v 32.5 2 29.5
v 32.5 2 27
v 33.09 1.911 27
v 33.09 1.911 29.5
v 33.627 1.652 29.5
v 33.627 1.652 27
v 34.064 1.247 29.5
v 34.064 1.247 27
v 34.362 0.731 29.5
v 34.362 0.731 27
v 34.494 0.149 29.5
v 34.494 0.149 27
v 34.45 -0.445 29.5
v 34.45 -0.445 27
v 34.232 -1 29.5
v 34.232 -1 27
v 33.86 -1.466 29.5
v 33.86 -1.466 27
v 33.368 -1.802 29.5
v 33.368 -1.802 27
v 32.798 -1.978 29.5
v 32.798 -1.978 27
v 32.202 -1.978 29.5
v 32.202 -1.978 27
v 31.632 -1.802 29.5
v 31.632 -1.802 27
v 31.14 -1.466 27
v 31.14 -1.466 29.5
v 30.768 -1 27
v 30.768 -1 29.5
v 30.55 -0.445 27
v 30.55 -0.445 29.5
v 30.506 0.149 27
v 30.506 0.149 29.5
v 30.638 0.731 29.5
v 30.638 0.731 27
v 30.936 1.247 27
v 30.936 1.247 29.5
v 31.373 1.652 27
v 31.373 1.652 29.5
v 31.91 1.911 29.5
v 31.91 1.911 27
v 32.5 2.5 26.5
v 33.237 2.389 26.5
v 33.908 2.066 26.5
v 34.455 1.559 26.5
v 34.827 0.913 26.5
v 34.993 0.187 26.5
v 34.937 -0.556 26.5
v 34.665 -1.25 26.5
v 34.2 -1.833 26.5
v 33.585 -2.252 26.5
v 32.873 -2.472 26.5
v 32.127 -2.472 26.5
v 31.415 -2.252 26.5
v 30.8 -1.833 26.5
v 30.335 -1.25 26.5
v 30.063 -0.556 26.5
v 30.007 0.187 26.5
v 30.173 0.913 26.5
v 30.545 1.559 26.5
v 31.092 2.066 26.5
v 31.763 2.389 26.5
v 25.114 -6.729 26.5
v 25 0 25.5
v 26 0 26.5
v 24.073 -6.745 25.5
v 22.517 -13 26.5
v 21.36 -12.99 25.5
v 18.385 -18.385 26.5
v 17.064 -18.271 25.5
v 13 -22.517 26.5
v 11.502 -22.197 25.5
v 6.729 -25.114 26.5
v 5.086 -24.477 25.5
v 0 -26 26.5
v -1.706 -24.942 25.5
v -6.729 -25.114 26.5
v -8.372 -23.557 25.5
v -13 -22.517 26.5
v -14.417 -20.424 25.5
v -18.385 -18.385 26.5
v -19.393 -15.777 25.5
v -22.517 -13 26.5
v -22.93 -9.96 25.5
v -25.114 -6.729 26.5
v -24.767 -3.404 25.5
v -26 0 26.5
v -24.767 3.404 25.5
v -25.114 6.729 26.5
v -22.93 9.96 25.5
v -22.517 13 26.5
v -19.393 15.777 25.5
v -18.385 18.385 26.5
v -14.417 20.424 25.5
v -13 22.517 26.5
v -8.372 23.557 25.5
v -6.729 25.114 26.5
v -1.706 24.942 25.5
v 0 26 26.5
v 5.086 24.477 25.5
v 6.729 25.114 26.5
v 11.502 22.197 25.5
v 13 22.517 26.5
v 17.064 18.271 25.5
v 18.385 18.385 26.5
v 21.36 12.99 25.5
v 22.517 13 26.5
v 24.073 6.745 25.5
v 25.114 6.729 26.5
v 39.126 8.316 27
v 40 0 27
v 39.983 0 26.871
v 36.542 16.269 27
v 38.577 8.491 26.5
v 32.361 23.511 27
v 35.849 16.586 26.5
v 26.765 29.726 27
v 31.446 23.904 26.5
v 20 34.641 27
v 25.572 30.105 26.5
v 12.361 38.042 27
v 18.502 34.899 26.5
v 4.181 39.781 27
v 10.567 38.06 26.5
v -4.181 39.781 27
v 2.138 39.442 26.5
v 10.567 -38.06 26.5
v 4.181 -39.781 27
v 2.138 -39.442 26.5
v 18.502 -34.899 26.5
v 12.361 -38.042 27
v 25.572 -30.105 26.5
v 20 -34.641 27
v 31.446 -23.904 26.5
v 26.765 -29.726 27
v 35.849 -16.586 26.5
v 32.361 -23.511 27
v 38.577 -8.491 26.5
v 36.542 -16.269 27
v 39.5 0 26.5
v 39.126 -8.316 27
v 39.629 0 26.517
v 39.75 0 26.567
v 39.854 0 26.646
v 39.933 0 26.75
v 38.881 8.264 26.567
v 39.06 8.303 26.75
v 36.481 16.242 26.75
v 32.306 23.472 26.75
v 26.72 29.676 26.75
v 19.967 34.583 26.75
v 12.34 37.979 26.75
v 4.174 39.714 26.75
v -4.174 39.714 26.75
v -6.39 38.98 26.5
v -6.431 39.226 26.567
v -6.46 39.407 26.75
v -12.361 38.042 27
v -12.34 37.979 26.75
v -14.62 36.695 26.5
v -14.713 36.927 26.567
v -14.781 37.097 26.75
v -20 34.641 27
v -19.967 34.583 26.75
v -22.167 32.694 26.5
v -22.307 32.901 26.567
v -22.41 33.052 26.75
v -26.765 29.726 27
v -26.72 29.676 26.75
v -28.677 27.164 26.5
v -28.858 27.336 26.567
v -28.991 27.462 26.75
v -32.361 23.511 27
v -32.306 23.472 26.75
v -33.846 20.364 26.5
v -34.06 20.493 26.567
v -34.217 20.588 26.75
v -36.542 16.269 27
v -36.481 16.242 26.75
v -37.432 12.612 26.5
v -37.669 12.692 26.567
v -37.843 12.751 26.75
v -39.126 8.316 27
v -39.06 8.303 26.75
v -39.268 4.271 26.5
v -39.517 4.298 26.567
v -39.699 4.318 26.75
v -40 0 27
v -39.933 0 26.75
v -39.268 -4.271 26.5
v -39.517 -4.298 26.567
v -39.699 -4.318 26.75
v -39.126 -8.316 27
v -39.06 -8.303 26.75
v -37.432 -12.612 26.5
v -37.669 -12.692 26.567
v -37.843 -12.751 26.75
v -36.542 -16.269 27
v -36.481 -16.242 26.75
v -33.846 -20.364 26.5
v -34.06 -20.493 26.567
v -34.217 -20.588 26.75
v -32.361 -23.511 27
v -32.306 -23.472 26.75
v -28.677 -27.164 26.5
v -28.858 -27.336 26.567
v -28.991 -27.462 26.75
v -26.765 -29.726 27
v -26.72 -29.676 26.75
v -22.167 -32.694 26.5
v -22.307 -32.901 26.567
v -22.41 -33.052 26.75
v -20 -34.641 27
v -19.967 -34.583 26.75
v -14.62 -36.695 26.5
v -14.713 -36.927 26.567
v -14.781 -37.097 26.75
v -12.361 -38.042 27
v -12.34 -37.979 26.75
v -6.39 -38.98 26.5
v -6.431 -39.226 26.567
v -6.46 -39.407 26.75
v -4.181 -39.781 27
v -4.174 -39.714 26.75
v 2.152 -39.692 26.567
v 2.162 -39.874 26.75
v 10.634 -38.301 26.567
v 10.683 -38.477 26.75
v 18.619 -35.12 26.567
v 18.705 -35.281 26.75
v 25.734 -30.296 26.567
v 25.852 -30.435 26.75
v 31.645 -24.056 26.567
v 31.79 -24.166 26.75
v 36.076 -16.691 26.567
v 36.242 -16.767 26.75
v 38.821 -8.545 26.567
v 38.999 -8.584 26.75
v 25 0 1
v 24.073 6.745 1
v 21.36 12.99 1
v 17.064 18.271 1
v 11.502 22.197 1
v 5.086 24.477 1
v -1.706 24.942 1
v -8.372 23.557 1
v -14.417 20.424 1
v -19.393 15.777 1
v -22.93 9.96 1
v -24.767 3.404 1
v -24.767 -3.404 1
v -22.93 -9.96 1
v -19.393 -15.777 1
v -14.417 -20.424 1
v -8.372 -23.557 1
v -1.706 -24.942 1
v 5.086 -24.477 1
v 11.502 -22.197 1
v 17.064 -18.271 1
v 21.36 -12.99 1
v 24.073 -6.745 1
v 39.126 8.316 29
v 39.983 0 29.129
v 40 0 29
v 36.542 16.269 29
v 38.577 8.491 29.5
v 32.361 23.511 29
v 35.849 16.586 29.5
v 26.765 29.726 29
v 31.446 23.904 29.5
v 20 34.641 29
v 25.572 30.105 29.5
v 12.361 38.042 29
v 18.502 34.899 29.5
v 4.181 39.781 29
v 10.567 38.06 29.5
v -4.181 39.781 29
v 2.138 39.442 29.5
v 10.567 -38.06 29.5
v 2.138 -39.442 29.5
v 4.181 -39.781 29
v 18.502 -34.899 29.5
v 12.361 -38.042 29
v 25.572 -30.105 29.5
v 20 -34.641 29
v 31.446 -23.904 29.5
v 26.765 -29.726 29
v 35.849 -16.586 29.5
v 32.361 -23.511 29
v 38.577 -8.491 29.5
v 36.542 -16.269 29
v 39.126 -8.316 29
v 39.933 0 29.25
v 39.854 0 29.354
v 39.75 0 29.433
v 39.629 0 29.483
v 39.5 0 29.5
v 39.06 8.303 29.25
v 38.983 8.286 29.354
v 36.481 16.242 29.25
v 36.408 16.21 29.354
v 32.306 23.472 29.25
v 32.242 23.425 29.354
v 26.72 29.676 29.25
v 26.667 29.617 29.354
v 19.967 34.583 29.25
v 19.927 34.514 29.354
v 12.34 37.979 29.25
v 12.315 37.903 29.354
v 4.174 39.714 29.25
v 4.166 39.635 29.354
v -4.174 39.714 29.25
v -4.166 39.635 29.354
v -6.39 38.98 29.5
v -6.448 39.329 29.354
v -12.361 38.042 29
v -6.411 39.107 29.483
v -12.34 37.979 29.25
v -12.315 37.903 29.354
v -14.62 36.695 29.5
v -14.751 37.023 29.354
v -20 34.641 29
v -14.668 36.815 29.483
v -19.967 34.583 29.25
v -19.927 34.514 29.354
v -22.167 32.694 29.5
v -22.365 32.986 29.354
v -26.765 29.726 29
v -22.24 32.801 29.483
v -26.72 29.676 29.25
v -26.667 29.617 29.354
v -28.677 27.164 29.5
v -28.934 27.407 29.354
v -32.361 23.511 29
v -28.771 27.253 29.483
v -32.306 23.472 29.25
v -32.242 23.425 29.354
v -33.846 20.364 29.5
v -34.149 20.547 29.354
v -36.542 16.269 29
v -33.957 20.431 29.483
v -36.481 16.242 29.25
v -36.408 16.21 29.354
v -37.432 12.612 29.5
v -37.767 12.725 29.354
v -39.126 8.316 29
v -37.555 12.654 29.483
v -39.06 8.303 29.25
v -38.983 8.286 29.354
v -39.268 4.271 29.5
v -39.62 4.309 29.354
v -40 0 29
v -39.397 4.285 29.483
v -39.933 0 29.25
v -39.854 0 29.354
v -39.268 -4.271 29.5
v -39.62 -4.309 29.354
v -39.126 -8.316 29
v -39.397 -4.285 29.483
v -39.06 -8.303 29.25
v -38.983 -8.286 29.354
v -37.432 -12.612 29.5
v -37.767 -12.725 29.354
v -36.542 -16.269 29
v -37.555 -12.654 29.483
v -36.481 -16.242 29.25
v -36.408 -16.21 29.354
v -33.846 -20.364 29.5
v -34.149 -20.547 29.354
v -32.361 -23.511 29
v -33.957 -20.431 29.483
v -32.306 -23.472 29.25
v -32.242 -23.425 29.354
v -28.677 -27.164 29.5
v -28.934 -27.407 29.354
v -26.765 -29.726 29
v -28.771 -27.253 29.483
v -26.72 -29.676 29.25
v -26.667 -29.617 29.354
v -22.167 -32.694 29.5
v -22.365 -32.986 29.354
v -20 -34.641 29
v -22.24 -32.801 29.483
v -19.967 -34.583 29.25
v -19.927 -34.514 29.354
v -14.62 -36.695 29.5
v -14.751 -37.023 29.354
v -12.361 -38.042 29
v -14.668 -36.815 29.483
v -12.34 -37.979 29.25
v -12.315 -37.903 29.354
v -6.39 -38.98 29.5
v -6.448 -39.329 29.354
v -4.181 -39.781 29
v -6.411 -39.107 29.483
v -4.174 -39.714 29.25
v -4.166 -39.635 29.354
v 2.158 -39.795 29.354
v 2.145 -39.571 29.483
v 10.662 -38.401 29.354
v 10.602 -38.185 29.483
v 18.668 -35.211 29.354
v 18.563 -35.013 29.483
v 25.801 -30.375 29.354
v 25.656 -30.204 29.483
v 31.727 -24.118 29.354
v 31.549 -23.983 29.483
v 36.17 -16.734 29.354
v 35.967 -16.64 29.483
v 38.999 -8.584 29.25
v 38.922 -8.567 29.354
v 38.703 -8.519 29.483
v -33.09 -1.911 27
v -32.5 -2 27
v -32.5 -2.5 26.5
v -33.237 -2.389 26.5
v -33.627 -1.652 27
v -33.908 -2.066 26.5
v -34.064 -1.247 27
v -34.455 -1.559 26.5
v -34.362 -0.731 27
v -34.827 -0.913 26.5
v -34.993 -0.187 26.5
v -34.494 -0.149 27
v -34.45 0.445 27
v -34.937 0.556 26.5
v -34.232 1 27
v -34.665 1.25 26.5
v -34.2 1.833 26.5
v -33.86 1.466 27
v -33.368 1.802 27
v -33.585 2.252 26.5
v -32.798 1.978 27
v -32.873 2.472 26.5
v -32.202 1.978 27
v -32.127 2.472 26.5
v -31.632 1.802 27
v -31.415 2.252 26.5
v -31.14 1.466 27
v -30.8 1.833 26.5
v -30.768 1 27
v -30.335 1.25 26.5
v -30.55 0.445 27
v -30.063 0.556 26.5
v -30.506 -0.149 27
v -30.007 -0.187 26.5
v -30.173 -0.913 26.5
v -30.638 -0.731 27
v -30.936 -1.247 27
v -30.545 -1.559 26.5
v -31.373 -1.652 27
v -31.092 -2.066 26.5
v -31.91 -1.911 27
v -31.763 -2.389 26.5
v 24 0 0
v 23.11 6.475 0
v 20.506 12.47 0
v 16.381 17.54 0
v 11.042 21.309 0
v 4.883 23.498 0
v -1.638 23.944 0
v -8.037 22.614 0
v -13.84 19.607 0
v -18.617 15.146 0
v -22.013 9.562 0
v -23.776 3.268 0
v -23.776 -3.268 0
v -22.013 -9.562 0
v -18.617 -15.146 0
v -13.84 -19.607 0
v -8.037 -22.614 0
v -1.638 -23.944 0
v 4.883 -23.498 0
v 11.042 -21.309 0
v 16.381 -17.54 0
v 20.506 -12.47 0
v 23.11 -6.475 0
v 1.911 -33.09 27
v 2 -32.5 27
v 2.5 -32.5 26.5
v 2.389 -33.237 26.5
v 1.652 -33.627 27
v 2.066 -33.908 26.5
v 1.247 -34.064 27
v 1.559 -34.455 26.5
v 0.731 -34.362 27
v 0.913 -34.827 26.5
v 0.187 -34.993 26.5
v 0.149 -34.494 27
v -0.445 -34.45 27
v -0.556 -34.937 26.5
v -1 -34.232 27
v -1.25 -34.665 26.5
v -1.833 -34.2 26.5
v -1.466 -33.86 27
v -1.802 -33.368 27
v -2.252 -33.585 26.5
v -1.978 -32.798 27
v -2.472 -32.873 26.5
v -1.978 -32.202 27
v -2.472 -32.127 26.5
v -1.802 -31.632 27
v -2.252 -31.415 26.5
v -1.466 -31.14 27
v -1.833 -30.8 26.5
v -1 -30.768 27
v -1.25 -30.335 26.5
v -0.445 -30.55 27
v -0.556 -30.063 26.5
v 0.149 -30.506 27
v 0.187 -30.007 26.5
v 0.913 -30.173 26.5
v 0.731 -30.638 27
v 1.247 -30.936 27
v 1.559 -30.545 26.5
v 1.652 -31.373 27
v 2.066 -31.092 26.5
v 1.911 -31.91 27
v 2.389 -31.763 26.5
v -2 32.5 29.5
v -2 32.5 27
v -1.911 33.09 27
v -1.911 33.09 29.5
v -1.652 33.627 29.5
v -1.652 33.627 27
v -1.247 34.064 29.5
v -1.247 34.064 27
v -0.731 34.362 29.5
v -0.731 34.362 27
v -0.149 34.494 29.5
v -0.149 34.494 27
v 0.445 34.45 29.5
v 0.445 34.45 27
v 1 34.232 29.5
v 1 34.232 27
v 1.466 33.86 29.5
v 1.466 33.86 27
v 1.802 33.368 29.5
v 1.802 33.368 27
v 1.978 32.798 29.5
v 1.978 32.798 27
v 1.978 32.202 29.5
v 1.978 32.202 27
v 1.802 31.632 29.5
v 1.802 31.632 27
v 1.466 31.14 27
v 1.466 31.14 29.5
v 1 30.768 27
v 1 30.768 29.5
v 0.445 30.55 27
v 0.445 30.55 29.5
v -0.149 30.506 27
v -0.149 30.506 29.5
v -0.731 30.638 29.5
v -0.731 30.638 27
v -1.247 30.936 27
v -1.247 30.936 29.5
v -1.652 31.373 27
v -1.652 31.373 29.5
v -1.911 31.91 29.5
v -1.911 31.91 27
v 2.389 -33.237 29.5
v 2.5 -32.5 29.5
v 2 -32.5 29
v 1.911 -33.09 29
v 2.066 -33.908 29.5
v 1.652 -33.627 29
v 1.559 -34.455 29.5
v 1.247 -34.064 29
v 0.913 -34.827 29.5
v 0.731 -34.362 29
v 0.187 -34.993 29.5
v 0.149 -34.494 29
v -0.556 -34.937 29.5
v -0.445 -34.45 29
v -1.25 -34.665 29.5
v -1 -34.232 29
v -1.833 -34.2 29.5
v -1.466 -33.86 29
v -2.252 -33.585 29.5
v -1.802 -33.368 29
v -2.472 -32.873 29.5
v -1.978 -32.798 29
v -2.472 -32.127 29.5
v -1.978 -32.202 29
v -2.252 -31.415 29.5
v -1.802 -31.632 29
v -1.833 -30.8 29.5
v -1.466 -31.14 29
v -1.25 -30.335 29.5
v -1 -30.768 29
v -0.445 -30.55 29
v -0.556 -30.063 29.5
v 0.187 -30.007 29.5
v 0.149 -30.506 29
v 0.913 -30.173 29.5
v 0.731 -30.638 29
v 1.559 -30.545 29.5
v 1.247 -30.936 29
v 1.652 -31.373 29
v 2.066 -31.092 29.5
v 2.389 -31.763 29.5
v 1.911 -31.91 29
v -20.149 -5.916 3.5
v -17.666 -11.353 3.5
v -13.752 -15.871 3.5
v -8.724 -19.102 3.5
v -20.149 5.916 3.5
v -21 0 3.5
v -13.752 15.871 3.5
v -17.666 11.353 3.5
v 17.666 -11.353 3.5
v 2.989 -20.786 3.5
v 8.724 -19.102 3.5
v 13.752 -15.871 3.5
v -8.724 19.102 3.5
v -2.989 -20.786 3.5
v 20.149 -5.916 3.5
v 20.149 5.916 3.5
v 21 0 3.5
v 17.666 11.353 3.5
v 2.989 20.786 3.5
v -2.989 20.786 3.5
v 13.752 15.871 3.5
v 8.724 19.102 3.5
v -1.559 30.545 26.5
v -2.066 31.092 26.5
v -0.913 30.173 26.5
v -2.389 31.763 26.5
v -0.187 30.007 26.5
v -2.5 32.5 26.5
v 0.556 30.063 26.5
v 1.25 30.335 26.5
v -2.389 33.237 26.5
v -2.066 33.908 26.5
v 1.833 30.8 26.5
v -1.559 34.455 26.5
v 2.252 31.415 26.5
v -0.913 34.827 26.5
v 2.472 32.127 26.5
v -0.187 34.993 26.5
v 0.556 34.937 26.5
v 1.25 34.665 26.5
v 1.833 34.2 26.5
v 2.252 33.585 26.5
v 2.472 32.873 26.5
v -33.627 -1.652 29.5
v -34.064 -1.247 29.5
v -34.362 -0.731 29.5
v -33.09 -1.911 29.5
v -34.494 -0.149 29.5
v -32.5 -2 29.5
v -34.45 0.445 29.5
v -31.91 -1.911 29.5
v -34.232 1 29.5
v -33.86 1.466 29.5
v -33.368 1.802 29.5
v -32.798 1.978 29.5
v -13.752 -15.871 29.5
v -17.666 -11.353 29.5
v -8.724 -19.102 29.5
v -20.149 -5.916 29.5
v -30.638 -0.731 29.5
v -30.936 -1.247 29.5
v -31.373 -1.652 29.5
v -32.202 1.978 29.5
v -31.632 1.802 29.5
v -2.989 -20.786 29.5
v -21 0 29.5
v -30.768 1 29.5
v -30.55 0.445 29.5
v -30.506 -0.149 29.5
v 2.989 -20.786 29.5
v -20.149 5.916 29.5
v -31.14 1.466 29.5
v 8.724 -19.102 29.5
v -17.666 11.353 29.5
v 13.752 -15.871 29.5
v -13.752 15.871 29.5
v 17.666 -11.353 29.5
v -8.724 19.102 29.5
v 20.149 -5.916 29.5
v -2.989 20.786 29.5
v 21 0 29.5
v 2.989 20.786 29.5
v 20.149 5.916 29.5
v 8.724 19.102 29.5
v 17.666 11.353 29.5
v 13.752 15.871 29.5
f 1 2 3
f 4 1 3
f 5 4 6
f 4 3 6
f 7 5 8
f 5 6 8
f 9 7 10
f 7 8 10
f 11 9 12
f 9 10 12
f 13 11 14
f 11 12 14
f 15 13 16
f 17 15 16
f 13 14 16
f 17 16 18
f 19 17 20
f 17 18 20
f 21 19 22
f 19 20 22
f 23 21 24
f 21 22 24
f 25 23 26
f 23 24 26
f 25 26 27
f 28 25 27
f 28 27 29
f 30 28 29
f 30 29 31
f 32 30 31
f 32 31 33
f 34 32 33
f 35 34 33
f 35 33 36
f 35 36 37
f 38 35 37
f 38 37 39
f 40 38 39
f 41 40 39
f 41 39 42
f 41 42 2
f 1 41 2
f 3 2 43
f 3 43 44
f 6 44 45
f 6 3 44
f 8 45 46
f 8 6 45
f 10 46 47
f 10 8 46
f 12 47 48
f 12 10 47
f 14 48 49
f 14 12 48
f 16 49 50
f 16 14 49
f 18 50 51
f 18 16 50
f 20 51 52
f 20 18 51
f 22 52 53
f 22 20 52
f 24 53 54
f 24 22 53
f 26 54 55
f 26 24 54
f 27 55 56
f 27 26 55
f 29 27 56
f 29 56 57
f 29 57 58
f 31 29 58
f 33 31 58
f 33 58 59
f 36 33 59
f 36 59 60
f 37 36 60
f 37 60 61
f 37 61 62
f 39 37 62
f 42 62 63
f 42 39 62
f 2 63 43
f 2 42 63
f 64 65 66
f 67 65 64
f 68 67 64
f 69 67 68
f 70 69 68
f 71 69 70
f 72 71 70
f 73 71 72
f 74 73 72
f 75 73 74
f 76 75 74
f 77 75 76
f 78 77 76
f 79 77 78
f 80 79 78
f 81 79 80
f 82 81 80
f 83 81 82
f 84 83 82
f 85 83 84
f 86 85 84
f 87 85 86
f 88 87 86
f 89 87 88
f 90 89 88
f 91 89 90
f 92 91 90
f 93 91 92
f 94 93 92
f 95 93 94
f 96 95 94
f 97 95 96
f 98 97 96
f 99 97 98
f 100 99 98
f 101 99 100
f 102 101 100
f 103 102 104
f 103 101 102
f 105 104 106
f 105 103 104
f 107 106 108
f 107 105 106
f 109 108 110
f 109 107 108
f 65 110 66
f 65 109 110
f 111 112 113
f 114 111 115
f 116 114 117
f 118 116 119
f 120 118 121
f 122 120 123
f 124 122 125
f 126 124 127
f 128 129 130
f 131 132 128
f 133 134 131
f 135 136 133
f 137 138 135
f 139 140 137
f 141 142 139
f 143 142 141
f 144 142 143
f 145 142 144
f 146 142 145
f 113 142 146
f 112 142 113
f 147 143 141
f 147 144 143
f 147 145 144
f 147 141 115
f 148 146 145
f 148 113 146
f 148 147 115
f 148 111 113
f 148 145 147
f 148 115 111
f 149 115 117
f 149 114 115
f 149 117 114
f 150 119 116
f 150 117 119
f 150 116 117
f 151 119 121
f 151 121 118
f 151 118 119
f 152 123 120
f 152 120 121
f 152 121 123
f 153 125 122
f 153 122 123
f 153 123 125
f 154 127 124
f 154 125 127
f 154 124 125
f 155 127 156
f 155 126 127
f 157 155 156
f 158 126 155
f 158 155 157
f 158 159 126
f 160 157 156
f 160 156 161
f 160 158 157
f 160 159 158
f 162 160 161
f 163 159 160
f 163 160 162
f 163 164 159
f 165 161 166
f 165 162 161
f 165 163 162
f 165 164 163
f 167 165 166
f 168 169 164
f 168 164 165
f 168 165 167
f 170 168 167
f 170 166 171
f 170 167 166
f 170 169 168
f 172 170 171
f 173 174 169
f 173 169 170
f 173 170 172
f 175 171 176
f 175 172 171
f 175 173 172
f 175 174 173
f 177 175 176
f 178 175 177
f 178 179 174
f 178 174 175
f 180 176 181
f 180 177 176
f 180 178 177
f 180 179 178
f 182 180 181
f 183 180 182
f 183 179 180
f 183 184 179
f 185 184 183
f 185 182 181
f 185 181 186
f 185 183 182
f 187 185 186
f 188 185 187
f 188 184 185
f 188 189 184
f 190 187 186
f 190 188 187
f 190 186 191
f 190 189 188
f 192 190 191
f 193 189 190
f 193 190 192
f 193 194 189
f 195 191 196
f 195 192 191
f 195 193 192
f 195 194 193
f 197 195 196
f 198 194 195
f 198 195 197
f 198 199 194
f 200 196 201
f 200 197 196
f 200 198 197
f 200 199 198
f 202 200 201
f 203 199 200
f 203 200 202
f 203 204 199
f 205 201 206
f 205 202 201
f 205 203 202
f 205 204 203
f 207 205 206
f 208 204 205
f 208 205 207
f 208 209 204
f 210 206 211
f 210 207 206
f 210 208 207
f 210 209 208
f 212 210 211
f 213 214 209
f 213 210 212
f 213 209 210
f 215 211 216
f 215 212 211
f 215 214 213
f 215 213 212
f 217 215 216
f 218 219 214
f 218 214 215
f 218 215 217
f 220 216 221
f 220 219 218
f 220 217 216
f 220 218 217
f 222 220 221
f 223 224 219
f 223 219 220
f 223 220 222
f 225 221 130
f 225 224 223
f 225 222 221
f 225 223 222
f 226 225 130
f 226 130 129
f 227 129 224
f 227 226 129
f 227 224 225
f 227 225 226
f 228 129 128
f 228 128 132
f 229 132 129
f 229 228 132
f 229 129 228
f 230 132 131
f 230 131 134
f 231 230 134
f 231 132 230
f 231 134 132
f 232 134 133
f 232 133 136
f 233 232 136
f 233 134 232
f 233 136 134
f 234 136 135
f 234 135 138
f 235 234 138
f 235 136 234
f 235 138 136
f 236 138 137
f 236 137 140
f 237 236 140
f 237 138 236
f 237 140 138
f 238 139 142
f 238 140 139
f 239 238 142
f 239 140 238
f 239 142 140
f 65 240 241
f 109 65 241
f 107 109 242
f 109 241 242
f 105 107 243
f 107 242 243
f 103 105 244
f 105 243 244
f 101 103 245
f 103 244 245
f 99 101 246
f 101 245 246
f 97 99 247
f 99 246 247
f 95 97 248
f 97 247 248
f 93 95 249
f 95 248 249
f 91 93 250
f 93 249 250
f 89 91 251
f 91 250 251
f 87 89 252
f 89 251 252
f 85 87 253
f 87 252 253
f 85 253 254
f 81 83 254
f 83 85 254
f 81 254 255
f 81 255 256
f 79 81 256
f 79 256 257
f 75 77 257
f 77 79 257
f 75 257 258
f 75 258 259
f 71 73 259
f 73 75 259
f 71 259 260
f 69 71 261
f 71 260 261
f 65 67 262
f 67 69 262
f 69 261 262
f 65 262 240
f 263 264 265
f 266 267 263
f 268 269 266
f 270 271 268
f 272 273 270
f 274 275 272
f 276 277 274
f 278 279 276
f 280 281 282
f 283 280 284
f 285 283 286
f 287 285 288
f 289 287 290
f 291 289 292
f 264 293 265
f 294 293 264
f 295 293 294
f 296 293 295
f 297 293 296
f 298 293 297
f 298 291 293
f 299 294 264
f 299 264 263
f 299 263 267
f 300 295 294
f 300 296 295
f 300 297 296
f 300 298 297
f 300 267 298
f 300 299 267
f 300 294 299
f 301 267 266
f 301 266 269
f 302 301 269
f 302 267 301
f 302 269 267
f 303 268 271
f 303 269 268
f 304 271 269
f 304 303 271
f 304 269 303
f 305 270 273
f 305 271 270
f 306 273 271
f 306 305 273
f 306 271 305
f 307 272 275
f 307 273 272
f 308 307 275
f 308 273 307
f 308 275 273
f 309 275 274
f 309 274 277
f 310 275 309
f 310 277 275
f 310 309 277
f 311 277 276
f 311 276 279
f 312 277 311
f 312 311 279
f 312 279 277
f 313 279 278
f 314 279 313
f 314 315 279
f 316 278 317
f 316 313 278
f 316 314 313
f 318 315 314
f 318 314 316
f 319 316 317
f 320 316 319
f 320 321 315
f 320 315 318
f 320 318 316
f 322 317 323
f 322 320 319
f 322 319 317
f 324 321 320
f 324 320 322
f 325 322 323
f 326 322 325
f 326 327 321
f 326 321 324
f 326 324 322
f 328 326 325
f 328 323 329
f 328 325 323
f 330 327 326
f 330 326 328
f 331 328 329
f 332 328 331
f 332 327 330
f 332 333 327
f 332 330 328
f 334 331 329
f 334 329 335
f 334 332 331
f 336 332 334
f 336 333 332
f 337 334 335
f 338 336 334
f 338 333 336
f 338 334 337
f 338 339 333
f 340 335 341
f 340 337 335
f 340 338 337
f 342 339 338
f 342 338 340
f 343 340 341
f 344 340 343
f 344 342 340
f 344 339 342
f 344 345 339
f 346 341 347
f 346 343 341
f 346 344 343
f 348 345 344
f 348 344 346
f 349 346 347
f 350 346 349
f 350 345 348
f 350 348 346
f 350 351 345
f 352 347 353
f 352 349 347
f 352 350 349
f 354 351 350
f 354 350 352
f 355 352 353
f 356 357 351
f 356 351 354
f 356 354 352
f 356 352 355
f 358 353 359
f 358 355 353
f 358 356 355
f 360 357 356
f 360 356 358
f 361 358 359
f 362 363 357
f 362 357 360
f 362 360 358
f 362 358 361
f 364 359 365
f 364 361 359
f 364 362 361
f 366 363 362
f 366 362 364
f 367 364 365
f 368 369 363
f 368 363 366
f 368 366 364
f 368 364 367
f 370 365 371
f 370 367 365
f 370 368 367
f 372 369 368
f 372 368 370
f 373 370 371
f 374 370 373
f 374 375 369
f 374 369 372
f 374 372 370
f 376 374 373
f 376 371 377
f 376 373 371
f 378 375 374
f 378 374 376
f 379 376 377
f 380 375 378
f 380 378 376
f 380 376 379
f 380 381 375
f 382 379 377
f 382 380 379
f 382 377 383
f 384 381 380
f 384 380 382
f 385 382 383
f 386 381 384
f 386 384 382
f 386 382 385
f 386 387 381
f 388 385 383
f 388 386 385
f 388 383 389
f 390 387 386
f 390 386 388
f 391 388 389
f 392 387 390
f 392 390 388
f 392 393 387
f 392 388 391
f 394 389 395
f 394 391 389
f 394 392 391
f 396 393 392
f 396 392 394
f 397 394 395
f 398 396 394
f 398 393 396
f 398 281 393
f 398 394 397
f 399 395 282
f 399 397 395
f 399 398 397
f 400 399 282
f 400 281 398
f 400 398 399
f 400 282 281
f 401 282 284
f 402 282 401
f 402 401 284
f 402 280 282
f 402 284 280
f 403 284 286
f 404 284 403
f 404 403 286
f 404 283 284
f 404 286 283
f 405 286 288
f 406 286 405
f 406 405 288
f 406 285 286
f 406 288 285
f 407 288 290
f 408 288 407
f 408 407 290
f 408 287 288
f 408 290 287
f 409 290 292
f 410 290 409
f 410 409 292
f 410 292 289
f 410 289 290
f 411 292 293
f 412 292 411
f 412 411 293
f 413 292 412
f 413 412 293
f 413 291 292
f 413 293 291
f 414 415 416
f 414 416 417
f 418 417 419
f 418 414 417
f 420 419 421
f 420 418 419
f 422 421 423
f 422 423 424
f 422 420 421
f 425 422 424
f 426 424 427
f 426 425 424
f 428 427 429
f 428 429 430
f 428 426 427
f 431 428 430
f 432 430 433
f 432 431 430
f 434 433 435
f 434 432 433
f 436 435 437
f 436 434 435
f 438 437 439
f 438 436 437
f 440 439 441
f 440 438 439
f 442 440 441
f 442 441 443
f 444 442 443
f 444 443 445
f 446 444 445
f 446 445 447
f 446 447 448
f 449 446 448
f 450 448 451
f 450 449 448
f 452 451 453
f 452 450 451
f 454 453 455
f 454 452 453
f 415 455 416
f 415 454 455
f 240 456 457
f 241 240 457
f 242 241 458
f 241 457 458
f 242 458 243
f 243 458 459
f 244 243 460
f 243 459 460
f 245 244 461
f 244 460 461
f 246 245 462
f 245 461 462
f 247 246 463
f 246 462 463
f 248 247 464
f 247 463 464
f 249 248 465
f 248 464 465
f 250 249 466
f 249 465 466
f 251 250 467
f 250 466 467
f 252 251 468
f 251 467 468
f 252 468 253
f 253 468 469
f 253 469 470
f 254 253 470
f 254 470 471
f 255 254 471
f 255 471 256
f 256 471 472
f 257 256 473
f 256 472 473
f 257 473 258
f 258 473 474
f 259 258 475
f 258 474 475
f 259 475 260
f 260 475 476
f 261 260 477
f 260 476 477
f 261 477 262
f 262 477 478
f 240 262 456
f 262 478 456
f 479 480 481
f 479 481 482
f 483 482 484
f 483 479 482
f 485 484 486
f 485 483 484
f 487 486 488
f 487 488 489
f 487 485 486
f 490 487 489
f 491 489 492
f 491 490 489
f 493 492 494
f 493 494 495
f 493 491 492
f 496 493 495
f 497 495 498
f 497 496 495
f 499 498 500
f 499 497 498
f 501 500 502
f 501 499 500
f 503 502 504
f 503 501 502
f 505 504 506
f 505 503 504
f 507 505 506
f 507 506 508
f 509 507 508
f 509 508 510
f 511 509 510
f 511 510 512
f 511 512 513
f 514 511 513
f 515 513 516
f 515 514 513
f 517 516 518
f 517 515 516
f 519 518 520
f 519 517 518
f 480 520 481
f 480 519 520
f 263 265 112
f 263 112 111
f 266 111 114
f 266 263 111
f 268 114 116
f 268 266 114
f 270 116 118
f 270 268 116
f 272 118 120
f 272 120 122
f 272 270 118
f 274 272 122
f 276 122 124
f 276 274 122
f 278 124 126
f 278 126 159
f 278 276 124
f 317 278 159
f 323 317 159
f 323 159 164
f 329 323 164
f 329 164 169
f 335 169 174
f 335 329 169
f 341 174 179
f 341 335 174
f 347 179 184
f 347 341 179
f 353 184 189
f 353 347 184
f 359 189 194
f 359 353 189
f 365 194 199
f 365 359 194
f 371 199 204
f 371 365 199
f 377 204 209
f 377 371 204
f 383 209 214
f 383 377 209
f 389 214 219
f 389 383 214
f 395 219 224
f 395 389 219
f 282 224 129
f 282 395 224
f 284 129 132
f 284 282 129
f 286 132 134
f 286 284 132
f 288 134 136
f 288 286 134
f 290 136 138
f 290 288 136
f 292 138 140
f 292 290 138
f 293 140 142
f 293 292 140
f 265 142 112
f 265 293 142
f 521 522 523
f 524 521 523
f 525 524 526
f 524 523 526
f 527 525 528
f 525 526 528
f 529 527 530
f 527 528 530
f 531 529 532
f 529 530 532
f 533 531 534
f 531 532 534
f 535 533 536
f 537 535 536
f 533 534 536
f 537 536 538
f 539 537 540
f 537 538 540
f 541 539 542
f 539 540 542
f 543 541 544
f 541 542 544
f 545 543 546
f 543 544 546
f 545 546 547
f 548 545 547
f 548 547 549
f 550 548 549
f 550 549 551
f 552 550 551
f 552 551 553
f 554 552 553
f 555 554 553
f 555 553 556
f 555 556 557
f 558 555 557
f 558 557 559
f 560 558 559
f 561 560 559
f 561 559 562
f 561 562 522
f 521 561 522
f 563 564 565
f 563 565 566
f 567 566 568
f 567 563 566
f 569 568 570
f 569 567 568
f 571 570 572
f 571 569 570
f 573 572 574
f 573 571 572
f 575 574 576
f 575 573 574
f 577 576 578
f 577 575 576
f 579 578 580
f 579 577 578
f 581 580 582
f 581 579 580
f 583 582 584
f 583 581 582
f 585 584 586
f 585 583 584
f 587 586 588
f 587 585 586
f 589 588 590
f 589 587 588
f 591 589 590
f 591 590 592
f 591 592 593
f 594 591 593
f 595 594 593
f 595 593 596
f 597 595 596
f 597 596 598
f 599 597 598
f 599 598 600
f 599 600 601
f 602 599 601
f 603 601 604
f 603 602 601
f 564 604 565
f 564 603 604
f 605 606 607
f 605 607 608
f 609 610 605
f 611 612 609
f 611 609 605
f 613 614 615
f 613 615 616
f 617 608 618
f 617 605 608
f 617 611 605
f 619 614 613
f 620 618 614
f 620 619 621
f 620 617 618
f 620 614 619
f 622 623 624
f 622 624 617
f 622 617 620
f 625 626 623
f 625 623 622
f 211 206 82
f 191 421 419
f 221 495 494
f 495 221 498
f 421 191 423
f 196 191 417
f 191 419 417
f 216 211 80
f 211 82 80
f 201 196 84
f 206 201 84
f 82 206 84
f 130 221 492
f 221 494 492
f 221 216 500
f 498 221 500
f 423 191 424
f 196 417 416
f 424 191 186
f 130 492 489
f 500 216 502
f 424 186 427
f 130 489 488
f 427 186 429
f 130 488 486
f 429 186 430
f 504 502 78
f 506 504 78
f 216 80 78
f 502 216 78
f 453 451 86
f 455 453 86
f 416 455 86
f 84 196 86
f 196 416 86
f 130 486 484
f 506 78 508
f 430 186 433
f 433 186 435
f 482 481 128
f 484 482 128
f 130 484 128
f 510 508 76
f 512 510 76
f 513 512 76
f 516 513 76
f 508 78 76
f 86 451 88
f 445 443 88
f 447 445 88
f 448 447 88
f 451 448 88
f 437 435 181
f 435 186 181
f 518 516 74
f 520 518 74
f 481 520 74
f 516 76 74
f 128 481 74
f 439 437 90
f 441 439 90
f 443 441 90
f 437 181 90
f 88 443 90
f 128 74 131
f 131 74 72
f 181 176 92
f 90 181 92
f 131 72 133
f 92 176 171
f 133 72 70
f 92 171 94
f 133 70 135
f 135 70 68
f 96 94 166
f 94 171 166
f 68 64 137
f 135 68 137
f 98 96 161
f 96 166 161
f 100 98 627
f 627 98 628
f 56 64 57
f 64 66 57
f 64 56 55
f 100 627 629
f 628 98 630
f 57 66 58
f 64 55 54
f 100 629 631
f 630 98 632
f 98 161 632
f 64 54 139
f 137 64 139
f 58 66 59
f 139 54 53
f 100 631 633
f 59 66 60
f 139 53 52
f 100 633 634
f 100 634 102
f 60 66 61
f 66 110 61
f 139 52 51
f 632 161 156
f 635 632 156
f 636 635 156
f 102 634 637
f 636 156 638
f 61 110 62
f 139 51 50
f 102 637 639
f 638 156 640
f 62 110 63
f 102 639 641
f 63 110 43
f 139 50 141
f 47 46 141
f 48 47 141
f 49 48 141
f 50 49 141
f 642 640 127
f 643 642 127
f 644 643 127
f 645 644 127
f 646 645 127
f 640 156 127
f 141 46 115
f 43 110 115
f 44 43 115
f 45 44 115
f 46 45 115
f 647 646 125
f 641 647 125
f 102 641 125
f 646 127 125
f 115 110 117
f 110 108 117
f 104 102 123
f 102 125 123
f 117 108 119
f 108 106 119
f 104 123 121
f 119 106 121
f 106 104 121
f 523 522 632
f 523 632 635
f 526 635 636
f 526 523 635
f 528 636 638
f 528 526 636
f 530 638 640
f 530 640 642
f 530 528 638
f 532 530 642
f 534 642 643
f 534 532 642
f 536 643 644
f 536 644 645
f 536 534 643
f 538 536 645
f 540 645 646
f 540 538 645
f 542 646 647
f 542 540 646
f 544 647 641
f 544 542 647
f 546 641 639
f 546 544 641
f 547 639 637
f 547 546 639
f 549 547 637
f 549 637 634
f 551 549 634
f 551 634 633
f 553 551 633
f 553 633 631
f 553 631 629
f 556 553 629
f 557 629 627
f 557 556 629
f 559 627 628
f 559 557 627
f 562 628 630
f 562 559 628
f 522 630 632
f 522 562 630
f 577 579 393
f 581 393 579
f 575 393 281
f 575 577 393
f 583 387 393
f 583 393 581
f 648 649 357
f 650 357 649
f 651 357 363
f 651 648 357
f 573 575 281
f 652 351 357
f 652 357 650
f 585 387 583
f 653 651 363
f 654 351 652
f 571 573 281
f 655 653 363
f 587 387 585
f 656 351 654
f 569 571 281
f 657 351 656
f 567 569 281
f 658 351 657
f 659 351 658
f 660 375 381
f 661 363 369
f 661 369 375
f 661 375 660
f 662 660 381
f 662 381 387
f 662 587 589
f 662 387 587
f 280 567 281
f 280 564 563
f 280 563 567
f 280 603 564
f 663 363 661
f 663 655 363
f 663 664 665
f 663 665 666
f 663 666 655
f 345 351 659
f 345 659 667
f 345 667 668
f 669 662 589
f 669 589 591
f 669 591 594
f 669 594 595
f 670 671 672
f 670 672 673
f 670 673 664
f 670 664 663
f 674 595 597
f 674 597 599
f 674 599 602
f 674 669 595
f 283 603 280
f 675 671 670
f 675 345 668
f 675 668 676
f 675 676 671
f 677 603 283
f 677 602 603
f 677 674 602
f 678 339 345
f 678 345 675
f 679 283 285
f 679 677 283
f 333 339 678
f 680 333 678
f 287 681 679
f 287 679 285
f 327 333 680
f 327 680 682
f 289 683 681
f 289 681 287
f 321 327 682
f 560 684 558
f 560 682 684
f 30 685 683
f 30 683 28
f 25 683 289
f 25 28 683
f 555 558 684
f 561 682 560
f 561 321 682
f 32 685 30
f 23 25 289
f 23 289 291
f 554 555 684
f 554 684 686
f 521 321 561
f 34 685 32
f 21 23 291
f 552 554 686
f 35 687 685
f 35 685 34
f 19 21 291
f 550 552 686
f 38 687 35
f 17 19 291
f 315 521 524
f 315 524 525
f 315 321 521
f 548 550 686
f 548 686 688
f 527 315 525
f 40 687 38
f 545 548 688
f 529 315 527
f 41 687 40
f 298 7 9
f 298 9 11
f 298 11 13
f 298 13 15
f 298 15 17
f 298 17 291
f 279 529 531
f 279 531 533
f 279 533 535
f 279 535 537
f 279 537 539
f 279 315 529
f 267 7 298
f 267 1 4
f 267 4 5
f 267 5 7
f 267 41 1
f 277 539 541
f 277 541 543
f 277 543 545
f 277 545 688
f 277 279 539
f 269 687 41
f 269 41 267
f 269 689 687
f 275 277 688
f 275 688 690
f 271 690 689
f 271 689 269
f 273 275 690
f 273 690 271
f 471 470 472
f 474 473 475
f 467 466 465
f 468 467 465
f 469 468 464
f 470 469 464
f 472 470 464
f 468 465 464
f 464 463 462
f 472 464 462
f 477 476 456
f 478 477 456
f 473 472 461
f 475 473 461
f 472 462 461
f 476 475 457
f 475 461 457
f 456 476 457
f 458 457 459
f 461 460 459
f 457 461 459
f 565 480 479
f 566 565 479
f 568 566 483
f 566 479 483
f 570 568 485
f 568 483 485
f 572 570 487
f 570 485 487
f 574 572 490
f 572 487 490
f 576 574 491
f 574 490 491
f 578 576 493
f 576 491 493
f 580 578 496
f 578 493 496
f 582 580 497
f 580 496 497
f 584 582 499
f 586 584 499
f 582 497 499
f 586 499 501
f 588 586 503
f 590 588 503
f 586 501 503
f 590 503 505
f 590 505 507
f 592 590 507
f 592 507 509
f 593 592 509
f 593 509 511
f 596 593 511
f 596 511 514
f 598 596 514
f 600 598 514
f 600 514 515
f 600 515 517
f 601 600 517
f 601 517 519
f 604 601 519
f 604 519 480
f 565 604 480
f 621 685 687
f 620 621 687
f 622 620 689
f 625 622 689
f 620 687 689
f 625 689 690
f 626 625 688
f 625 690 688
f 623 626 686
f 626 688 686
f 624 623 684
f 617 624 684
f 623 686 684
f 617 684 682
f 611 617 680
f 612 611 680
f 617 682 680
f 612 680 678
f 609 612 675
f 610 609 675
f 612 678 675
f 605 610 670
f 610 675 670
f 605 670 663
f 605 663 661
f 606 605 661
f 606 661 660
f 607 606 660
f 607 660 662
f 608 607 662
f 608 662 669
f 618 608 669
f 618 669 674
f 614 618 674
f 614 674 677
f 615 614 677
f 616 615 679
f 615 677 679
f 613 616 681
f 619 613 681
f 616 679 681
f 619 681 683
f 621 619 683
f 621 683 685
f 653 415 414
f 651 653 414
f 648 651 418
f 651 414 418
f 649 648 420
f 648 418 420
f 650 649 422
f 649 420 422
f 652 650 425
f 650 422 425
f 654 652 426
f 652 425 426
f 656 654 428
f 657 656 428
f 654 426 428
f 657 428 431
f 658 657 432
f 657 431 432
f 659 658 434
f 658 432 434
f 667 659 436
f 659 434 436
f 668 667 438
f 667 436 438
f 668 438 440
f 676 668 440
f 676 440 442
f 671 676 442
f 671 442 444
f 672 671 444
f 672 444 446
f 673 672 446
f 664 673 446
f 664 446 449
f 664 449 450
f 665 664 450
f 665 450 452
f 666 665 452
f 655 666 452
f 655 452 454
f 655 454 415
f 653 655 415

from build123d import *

# Parameters (mm, degrees)
SKETCH1_R           = 25
BOSS_EXTRUDE1_DEPTH = 29.5
SKETCH2_R           = 40
BOSS_EXTRUDE2_DEPTH = 3
CHAMFER1_SIZE       = 1
SKETCH3_R           = 21
CUT_EXTRUDE1_DEPTH  = 26
FILLET1_R           = 0.5
SKETCH4_R           = 2
CUT_EXTRUDE2_DEPTH  = 26
CIRPATTERN1_COUNT   = 4
CHAMFER2_SIZE       = 0.5


with BuildPart() as part:
    # Sketch1 → Boss-Extrude1 (new body)
    with BuildSketch(Plane.XY):
        Circle(SKETCH1_R)
    extrude(amount=BOSS_EXTRUDE1_DEPTH)

    # Sketch2 → Boss-Extrude2 (add)
    with BuildSketch(Plane.XY.offset(29.5)):
        Circle(SKETCH2_R)
    extrude(amount=-BOSS_EXTRUDE2_DEPTH)

    # Chamfer1
    chamfer1_edges = [part.edges().sort_by_distance(p)[0] for p in [
        (-25, 0, 0),
        (-25, 0, 26.5),
    ]]
    chamfer(chamfer1_edges, length=CHAMFER1_SIZE)

    # Sketch3 → Cut-Extrude1 (cut)
    with BuildSketch(Plane.XY.offset(29.5)):
        Circle(SKETCH3_R)
    extrude(amount=-CUT_EXTRUDE1_DEPTH, mode=Mode.SUBTRACT)

    # Fillet1
    fillet1_edges = [part.edges().sort_by_distance(p)[0] for p in [
        (-40, 0, 26.5),
        (-40, 0, 29.5),
    ]]
    fillet(fillet1_edges, radius=FILLET1_R)

    # Sketch4 → Cut-Extrude2 (cut)
    with BuildSketch(Plane(origin=(0, 0, 26.5), x_dir=(-1, 0, 0), z_dir=(0, 0, -1))):
        with Locations((0, 32.5)):
            Circle(SKETCH4_R)
    cut_extrude2 = extrude(amount=-CUT_EXTRUDE2_DEPTH, mode=Mode.SUBTRACT)

    # CirPattern1: Cut-Extrude2 ×4 about axis
    cirpattern1_axis = Axis((0, 0, 0), (0, 0, 1))
    for i in range(1, CIRPATTERN1_COUNT):
        add(cut_extrude2.rotate(cirpattern1_axis, i * 360 / CIRPATTERN1_COUNT), mode=Mode.SUBTRACT)

    # Chamfer2
    chamfer2_edges = [part.edges().sort_by_distance(p)[0] for p in [
        (2, 32.5, 26.5),
        (32.5, -2, 26.5),
        (-2, -32.5, 29.5),
        (-2, -32.5, 26.5),
        (-32.5, 2, 26.5),
    ]]
    chamfer(chamfer2_edges, length=CHAMFER2_SIZE)


solid = part.part
